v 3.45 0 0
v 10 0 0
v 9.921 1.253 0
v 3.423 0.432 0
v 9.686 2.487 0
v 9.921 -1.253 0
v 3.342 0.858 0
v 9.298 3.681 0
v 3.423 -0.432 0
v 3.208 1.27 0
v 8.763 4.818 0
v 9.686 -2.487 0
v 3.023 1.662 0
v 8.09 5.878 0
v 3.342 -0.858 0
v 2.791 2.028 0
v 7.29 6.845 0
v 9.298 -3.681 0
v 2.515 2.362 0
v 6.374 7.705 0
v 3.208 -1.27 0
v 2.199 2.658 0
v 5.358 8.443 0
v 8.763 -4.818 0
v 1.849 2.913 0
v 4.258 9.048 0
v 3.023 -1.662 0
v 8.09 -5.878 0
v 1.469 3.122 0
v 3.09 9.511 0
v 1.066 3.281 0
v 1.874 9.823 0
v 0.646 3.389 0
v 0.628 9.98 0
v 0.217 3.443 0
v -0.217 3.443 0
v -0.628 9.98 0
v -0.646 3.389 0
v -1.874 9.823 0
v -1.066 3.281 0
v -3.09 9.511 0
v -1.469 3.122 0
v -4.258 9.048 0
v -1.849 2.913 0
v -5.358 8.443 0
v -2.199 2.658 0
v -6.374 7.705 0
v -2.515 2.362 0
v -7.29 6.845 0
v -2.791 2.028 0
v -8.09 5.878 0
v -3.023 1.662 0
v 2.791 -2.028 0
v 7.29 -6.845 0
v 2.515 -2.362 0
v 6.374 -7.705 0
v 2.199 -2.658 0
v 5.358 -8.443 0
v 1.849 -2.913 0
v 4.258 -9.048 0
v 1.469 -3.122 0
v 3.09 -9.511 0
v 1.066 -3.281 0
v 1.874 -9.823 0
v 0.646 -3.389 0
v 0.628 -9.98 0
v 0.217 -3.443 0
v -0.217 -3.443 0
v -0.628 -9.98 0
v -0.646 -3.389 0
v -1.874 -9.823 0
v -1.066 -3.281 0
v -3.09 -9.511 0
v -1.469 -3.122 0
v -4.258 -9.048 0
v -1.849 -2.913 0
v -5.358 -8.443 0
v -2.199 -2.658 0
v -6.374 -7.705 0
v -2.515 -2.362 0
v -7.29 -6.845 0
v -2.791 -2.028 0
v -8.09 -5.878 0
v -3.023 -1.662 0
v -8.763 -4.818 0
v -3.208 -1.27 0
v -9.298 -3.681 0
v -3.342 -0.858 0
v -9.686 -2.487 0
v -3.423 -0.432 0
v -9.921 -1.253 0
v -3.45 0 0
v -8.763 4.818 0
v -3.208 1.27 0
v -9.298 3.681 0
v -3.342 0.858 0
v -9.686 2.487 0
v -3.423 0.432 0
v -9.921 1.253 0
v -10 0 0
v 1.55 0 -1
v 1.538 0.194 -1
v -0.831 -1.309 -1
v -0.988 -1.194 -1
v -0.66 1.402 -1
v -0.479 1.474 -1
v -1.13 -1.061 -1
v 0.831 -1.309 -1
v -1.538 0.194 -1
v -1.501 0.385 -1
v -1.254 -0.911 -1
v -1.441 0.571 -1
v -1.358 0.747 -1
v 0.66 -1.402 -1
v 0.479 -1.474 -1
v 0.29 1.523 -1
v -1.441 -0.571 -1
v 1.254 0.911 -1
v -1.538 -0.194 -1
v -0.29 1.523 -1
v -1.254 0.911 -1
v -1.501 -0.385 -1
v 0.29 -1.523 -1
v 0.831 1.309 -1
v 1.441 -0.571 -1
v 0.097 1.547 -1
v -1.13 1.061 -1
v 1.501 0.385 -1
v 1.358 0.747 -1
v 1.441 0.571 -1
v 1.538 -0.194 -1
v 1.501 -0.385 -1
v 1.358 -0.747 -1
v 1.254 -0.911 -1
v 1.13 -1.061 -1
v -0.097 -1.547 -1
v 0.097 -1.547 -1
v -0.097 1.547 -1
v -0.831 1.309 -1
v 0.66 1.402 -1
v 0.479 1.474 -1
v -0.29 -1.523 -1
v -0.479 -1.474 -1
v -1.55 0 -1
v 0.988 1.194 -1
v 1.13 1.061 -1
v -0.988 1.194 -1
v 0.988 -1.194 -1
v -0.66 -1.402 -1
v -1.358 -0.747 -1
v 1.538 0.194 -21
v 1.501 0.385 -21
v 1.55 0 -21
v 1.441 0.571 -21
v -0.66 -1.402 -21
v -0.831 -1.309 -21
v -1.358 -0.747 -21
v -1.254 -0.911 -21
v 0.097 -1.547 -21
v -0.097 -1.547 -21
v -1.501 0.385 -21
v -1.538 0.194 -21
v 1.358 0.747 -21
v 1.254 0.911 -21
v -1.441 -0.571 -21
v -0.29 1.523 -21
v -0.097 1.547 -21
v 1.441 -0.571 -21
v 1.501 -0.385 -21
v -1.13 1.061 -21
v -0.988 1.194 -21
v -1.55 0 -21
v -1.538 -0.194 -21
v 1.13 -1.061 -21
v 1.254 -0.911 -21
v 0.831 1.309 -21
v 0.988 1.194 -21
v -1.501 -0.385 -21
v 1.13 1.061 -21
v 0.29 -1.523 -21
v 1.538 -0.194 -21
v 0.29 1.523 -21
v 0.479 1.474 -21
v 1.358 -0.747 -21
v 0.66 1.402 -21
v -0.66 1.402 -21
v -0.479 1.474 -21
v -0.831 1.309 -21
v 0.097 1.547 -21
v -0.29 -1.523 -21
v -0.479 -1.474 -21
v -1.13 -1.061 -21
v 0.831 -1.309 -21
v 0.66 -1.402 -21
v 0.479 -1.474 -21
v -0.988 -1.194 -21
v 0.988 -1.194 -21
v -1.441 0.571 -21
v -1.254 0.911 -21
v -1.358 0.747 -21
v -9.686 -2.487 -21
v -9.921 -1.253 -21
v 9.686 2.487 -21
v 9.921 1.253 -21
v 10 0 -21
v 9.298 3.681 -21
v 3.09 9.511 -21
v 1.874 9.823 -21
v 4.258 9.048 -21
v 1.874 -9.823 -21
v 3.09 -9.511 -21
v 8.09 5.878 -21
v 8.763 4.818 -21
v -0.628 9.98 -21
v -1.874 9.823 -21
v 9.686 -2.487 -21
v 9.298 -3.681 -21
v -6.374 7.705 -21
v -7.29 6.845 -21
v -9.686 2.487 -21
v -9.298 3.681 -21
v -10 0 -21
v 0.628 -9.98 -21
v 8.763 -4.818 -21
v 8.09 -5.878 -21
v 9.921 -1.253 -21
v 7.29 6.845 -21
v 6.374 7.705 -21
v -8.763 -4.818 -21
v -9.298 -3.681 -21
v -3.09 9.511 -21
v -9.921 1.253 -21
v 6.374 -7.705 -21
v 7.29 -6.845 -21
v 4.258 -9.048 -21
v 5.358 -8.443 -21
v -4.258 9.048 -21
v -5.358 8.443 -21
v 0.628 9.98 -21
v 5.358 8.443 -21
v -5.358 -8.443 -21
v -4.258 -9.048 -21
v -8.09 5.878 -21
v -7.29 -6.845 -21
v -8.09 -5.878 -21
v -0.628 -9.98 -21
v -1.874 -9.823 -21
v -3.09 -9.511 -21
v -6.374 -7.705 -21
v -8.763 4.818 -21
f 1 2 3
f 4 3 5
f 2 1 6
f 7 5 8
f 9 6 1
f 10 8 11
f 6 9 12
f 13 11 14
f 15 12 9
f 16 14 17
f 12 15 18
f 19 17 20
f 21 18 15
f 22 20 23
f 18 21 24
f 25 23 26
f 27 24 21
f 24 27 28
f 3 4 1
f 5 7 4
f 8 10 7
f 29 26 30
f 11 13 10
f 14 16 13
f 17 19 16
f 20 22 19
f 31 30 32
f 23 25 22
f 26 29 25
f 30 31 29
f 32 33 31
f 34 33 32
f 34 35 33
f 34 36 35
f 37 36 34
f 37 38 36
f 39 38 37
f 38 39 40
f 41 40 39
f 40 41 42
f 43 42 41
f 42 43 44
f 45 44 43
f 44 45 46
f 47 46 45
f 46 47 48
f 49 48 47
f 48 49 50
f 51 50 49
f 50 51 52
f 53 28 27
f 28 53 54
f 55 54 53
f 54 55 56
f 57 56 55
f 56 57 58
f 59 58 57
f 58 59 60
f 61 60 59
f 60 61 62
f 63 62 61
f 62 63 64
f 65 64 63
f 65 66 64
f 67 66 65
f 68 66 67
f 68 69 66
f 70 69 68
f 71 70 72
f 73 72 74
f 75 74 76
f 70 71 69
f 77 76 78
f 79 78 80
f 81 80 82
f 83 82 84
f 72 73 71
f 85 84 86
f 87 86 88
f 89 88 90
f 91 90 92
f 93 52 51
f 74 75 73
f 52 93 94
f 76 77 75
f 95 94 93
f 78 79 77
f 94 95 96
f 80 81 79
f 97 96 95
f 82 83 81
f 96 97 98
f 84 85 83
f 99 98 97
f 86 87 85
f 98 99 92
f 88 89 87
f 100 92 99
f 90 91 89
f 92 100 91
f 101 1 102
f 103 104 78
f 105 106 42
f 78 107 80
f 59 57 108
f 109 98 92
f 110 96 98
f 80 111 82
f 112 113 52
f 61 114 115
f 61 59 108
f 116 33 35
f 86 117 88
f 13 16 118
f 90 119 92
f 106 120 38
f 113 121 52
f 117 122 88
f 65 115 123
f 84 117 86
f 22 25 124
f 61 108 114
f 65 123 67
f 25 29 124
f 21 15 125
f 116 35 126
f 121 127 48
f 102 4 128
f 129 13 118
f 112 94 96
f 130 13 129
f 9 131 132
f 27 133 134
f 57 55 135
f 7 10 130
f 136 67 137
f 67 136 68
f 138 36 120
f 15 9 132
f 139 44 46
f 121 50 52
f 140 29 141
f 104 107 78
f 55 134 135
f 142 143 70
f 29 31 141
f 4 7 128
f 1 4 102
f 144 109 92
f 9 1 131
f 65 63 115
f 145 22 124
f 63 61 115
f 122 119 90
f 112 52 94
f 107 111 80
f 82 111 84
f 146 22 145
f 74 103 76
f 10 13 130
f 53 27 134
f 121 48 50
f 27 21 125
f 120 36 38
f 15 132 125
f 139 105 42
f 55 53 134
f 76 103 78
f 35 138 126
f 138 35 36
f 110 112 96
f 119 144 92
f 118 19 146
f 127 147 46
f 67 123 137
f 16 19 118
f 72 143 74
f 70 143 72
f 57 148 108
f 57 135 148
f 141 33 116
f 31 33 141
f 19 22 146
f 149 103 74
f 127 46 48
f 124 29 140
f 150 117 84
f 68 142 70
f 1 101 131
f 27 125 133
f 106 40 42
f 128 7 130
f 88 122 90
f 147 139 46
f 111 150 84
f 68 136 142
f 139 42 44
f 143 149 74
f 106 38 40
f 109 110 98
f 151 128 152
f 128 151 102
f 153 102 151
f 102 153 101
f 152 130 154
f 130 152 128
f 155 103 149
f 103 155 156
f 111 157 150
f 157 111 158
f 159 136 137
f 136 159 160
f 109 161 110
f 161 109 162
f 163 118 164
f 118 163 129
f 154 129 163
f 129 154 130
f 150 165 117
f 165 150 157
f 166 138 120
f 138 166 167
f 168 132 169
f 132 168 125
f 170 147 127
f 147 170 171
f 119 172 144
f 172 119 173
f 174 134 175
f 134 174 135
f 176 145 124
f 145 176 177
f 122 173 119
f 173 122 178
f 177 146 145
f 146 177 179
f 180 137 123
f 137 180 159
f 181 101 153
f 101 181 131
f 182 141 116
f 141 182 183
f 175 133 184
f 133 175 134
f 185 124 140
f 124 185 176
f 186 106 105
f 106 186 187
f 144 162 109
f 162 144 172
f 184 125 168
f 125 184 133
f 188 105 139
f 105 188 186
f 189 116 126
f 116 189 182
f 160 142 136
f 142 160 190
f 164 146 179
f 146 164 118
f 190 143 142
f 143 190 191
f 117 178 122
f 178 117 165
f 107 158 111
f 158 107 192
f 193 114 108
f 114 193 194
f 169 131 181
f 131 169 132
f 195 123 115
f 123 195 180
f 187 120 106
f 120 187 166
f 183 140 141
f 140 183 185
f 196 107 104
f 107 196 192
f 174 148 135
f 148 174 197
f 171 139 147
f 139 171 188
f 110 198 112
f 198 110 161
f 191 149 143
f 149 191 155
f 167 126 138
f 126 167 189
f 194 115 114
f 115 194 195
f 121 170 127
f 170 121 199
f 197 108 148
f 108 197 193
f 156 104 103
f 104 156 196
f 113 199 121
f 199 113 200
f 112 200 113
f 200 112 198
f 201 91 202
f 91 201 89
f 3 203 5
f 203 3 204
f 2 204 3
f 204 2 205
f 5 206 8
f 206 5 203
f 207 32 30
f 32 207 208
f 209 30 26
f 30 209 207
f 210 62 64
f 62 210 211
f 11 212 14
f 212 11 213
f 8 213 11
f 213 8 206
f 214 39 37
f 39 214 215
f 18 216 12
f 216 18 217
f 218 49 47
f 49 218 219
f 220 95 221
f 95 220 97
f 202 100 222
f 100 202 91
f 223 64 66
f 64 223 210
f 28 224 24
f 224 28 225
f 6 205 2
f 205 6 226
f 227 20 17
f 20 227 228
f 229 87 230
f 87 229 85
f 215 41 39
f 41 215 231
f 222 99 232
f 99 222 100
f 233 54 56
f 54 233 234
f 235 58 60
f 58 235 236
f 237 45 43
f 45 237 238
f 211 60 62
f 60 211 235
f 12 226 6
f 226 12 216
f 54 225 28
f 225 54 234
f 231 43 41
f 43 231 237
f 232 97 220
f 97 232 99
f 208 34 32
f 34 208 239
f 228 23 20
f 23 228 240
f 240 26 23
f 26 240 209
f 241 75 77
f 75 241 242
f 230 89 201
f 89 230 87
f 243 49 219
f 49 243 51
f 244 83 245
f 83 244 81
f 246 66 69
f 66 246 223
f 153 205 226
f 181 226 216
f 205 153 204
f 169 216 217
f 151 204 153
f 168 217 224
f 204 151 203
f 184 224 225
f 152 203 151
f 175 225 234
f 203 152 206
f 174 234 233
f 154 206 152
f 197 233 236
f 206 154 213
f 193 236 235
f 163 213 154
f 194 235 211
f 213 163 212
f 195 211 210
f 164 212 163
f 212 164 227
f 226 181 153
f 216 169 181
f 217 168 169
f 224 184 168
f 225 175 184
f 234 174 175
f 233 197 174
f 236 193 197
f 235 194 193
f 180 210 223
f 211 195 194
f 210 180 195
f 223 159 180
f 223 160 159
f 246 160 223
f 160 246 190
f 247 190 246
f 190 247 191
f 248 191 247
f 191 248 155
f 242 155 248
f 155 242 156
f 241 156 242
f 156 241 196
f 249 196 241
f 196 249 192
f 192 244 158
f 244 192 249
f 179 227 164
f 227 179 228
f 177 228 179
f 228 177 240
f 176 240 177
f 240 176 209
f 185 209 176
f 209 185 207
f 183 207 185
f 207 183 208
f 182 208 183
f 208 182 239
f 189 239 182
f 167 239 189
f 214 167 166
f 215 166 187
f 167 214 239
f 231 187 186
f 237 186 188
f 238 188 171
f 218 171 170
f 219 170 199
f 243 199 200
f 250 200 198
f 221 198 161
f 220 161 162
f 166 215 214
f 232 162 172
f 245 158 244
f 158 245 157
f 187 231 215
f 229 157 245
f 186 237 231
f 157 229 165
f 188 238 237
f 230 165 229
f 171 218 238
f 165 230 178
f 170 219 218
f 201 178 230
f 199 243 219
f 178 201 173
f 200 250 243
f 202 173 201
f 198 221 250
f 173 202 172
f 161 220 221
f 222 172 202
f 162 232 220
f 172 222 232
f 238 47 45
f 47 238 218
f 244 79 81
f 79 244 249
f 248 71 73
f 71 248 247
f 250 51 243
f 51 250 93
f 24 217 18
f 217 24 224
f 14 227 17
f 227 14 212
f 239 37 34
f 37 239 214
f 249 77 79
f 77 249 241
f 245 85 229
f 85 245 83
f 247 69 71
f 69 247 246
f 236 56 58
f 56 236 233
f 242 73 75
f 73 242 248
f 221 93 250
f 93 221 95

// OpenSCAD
$fn = 50;


difference() {
	union() {
		translate(v = [0, 0, -21.0000000000]) {
			cylinder(h = 21, r = 10.0000000000);
		}
	}
	union() {
		translate(v = [0, 0, 0]) {
			rotate(a = [0, 0, 0]) {
				difference() {
					union() {
						translate(v = [0, 0, -24.0000000000]) {
							cylinder(h = 24, r = 1.2500000000);
						}
						translate(v = [0, 0, -1.0000000000]) {
							cylinder(h = 1.0000000000, r1 = 1.5500000000, r2 = 3.4500000000);
						}
						translate(v = [0, 0, -24.0000000000]) {
							cylinder(h = 24, r = 1.5500000000);
						}
						translate(v = [0, 0, -24.0000000000]) {
							cylinder(h = 24, r = 1.2500000000);
						}
					}
					union();
				}
			}
		}
	}
}
